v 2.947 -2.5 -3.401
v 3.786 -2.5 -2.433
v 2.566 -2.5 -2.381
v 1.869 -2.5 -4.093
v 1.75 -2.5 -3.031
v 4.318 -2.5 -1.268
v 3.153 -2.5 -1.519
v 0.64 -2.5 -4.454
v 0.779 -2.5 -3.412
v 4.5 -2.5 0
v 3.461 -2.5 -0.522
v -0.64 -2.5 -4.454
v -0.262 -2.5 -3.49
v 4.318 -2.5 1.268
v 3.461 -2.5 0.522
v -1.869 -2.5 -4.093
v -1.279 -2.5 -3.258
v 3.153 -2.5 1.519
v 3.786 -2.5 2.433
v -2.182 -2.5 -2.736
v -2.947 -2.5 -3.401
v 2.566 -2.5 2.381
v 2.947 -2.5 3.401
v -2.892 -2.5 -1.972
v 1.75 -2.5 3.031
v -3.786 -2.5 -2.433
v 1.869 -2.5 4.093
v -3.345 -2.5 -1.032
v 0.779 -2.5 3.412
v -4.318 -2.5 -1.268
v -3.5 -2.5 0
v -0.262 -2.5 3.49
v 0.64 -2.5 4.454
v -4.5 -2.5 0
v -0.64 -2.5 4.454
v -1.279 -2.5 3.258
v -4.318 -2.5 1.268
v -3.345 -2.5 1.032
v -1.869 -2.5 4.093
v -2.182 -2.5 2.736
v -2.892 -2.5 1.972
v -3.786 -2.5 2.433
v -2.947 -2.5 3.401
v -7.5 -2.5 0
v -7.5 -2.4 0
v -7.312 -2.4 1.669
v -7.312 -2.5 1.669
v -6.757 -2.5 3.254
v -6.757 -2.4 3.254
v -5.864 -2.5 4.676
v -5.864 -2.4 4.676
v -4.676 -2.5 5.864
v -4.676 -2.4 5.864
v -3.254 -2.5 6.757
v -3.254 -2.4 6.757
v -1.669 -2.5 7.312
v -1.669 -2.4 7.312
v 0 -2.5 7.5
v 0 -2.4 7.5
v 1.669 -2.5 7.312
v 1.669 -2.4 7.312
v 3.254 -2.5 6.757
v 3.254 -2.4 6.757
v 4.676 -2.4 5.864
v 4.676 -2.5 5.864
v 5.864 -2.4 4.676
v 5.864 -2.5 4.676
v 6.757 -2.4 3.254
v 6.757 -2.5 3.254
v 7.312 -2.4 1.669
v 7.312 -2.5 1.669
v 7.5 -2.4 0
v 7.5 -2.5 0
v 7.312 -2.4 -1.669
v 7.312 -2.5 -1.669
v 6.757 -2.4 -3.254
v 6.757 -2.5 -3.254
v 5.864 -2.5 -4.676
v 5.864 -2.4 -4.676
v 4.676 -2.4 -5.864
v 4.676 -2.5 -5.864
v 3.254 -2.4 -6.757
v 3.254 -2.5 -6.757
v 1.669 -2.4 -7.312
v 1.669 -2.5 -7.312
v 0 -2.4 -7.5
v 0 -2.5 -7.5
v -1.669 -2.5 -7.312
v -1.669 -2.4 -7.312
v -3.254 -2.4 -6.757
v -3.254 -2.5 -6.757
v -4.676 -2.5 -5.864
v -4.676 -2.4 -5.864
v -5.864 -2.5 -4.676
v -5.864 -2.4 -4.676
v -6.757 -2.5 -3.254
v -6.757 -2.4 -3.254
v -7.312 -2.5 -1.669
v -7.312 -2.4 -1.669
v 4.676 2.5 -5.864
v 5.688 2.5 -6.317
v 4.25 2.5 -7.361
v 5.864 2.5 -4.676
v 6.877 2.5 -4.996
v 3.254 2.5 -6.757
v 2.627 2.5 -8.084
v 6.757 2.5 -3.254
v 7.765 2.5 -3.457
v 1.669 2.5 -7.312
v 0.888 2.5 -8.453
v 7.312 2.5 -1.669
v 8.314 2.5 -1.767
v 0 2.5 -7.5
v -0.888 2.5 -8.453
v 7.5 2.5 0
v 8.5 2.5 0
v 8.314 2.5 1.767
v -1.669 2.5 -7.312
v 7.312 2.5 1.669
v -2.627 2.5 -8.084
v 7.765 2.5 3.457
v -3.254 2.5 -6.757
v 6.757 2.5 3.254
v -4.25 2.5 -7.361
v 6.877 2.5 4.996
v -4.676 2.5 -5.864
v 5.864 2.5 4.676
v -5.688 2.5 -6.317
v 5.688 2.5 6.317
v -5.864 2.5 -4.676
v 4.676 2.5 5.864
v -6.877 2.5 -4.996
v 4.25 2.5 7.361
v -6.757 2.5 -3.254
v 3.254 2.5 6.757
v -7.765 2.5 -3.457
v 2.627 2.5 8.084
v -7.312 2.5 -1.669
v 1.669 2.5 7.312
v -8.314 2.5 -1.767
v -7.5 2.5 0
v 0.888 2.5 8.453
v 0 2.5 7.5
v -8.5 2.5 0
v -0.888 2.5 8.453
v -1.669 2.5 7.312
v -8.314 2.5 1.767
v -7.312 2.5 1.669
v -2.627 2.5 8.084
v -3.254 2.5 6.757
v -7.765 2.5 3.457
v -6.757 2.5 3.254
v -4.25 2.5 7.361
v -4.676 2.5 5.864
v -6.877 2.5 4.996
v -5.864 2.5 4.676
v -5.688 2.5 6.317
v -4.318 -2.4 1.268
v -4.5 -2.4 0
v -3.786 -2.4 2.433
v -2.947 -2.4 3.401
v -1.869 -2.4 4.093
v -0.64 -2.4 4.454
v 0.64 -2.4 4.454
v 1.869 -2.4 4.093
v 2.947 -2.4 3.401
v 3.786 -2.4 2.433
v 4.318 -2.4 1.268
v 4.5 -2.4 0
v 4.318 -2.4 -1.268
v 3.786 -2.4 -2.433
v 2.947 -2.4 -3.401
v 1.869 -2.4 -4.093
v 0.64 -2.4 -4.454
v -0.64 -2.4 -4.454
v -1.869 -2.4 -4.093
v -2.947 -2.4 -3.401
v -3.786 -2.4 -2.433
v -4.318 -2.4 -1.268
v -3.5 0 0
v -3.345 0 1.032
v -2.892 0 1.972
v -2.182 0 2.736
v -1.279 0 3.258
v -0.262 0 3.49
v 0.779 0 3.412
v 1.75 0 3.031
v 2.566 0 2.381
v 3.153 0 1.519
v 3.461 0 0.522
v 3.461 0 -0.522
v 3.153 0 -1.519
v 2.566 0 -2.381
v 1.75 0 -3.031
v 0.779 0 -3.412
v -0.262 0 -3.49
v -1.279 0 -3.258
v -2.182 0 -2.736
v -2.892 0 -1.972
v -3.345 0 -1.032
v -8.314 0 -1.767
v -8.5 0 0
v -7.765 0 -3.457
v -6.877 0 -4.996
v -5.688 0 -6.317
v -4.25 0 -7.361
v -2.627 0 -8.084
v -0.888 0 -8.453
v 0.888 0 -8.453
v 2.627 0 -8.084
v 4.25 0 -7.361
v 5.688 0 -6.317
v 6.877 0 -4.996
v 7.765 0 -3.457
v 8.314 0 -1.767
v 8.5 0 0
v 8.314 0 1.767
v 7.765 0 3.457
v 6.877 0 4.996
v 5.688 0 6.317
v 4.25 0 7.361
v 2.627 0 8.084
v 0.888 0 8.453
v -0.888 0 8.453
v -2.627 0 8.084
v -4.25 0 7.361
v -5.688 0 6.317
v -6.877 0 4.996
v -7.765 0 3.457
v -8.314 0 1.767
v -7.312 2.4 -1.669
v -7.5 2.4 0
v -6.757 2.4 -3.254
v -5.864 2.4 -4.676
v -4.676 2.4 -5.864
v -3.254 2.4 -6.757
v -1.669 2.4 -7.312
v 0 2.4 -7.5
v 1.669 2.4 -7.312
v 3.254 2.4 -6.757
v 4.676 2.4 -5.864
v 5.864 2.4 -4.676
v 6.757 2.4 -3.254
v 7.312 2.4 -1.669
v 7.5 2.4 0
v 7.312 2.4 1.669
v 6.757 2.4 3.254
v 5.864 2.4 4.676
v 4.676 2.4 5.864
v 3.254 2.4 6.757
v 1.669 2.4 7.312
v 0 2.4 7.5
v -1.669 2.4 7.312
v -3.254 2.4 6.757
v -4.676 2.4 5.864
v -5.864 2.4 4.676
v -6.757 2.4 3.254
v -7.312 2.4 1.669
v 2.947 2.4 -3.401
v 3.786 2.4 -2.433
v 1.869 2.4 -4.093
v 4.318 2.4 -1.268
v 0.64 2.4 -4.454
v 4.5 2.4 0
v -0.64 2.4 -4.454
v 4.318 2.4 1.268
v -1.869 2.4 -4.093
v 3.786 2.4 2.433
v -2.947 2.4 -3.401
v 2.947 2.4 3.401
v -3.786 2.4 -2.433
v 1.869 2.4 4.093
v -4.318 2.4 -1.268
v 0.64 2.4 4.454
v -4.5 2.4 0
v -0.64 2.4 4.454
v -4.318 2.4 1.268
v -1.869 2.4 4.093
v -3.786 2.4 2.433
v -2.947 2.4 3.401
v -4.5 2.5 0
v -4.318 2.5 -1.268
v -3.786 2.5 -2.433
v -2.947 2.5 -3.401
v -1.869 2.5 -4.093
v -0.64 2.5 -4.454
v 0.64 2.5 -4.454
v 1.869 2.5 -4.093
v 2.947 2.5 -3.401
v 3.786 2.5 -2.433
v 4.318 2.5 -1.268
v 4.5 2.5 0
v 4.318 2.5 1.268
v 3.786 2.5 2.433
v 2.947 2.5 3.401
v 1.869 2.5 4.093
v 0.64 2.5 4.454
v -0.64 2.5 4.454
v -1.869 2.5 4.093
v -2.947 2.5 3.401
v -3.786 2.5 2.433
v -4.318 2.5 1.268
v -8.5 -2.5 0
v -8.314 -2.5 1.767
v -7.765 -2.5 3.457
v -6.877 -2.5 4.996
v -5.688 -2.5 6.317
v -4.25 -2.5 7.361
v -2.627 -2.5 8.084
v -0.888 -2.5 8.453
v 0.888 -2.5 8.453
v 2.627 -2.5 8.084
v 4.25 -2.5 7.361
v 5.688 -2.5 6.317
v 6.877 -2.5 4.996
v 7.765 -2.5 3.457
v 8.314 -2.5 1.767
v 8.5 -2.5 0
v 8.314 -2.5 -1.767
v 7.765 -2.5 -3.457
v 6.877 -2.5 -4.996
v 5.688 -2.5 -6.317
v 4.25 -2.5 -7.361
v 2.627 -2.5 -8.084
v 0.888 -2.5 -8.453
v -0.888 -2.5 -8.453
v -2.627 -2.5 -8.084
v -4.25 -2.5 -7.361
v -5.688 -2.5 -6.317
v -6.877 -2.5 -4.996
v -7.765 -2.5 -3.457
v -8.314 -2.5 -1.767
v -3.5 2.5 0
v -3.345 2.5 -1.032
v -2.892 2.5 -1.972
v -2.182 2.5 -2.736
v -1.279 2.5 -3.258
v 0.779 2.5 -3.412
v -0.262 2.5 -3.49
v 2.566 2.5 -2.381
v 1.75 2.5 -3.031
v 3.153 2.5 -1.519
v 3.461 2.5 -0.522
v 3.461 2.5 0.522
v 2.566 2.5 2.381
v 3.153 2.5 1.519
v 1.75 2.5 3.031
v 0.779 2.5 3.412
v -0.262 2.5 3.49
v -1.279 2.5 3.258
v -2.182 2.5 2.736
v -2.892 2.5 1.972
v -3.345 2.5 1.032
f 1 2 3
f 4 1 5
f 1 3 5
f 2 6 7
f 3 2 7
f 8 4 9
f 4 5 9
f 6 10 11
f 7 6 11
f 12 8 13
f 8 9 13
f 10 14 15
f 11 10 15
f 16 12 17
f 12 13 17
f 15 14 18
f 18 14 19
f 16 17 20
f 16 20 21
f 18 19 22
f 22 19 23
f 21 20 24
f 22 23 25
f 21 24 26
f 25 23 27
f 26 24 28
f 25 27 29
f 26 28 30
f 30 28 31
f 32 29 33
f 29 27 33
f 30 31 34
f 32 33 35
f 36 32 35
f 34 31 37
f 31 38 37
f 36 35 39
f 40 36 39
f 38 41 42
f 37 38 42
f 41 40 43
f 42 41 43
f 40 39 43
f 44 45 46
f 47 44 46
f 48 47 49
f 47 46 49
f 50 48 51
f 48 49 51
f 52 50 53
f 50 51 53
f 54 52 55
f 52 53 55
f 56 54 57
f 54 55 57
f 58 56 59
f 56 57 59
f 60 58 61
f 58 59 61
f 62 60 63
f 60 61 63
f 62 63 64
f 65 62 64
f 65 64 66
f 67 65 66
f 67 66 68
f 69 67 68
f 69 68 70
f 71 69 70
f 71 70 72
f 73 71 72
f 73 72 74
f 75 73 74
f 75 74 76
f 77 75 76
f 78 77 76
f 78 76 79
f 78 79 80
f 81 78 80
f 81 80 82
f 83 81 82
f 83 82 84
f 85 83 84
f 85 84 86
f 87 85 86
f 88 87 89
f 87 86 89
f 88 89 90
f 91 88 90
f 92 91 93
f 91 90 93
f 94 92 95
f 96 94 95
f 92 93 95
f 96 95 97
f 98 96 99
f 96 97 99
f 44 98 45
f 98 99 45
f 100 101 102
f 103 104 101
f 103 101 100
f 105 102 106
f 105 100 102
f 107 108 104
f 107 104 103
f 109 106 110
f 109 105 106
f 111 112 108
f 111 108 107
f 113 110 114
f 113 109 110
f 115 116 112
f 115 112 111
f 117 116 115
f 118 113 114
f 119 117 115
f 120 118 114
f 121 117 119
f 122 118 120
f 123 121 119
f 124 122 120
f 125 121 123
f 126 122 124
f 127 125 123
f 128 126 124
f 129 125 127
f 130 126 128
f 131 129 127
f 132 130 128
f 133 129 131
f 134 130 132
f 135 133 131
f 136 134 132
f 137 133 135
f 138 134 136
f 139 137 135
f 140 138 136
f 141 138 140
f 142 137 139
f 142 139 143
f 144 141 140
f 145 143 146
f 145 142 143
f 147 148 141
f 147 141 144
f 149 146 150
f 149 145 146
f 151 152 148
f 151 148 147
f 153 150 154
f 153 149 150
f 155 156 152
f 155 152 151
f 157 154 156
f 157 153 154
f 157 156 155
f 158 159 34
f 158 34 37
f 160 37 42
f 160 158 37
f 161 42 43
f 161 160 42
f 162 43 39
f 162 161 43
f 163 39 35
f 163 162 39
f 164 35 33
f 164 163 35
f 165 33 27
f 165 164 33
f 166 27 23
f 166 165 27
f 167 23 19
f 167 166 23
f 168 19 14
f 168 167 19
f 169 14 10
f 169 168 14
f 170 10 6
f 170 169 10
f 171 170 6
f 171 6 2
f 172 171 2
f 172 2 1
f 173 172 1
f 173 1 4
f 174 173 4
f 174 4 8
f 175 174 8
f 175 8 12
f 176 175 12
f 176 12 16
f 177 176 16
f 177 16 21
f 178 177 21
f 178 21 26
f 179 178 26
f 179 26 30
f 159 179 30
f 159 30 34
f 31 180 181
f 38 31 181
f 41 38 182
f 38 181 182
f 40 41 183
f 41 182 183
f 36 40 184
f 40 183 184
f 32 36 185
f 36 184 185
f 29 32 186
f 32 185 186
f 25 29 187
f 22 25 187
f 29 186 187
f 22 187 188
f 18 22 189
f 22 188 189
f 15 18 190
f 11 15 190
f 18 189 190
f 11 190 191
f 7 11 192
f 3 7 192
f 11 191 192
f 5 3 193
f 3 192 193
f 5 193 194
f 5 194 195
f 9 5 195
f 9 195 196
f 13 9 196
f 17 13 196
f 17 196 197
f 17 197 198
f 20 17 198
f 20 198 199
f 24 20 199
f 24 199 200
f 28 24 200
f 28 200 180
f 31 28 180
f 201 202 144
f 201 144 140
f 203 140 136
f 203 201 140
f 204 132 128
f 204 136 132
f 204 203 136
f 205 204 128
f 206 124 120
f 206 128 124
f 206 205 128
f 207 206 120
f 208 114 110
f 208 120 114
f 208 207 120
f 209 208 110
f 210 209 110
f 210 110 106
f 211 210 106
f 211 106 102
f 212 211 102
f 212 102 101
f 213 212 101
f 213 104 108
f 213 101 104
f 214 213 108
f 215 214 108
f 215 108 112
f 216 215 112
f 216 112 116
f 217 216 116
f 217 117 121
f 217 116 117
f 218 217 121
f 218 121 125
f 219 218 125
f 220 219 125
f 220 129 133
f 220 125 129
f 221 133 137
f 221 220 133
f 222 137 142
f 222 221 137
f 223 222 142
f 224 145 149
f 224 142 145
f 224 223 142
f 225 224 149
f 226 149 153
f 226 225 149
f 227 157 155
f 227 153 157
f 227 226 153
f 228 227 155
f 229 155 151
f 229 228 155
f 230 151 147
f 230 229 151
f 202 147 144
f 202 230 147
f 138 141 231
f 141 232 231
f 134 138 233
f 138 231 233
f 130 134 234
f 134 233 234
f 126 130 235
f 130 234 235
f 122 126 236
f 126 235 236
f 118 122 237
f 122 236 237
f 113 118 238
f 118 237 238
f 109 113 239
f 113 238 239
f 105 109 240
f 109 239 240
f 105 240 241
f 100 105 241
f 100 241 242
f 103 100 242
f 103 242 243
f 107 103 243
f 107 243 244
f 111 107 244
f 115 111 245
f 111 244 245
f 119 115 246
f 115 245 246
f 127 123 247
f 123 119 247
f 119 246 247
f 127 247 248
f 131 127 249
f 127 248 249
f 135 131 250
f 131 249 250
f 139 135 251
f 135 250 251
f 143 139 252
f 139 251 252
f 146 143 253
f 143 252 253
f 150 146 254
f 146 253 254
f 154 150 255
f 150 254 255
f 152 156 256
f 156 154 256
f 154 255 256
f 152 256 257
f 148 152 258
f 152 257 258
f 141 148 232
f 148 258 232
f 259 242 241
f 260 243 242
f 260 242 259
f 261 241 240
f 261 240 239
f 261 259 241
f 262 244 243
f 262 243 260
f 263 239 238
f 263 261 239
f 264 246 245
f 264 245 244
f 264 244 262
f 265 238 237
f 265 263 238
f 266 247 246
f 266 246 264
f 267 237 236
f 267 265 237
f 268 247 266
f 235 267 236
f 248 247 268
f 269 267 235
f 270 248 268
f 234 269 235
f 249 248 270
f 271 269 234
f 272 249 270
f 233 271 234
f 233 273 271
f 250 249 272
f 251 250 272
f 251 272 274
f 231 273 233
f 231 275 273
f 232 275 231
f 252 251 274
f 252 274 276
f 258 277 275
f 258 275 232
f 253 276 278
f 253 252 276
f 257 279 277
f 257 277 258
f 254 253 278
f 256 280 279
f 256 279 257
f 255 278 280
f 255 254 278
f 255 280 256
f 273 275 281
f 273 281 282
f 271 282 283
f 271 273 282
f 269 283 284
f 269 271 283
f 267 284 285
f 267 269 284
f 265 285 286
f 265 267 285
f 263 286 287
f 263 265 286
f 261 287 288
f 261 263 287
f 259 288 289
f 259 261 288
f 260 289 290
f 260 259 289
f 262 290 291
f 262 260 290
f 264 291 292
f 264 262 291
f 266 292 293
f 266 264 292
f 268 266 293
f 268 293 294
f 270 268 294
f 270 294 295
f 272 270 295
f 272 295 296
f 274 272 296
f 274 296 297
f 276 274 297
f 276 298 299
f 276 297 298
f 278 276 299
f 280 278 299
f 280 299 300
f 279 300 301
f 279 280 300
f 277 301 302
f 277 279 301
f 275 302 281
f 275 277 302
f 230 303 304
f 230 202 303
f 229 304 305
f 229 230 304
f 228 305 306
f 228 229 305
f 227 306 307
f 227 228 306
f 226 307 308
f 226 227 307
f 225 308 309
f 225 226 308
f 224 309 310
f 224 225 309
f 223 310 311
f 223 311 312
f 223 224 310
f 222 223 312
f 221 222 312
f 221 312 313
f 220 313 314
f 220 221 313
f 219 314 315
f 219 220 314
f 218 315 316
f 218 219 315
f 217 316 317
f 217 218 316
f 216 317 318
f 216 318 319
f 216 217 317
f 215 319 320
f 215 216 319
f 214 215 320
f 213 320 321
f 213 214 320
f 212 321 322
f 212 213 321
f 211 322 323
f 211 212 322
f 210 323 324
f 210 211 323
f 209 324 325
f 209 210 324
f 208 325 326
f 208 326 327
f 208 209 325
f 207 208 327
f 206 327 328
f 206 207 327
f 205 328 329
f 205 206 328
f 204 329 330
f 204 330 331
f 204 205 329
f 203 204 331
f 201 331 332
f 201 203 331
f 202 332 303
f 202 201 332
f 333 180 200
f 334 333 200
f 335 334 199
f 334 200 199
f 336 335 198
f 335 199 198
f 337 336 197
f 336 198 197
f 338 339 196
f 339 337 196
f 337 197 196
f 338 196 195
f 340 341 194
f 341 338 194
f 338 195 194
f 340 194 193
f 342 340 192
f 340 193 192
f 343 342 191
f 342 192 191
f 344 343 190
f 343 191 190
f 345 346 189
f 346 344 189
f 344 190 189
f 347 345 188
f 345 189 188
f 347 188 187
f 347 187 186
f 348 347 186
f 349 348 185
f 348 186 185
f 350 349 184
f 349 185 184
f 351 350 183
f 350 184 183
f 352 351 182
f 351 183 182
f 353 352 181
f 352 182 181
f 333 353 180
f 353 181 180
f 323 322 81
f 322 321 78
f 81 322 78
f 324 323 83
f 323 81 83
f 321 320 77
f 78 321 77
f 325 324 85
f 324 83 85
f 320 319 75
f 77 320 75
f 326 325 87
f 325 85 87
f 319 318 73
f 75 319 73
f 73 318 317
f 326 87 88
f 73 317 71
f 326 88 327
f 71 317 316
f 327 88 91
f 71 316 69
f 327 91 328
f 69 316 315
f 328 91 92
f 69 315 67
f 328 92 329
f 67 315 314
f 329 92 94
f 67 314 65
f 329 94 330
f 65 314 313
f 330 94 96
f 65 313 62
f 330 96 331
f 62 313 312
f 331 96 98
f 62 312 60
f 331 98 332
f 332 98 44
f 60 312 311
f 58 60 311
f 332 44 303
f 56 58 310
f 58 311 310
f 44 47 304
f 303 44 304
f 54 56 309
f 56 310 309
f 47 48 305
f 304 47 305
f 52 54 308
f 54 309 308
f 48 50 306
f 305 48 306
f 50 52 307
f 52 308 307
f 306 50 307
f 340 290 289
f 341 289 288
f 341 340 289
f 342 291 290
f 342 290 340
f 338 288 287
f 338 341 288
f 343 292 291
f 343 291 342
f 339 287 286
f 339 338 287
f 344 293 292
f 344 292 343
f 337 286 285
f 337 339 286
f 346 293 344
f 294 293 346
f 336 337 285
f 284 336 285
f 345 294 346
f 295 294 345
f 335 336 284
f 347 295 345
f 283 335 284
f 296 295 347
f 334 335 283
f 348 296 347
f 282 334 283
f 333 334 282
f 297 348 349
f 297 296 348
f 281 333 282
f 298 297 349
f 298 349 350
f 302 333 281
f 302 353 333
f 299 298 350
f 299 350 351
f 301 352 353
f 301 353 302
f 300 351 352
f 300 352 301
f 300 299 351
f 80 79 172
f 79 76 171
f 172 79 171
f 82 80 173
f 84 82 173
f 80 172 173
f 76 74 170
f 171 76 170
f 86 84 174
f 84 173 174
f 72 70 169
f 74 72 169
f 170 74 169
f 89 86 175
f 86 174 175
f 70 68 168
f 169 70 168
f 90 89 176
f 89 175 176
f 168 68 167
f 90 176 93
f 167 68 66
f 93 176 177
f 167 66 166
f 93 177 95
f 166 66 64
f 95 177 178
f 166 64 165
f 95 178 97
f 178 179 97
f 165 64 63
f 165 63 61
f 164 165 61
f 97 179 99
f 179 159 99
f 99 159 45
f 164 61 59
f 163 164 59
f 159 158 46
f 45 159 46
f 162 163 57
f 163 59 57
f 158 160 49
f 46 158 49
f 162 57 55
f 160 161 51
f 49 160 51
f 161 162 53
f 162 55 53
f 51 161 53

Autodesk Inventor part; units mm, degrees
ref_plane "YZ Plane" through (0, 0, 0) normal (1, 0, 0) x (0, 1, 0)
ref_plane "XZ Plane" through (0, 0, 0) normal (0, 1, 0) x (-1, 0, 0)
ref_plane "XY Plane" through (0, 0, 0) normal (0, 0, 1) x (1, 0, 0)
sketch "Skizze1" plane through (0, 0, 0) normal (0, 1, 0) x (-1, 0, 0)
  circle A0 centre (0, 0) radius 8.5
  circle A1 centre (0, 0) radius 3.5
  circle A2 centre (0, 0) radius 7.5
  circle A3 centre (0, 0) radius 4.5
  dimension "d0" = 17
  dimension "d1" = 7
  dimension "d2" = 1
  dimension "d3" = 1
extrude "Extrusion1" add sketch "Skizze1" along normal mid plane 5
extrude "Extrusion2" add sketch "Skizze1" along normal mid plane 4.8 contours A2
properties part number "Kugellager 14 x 7 x 5"
